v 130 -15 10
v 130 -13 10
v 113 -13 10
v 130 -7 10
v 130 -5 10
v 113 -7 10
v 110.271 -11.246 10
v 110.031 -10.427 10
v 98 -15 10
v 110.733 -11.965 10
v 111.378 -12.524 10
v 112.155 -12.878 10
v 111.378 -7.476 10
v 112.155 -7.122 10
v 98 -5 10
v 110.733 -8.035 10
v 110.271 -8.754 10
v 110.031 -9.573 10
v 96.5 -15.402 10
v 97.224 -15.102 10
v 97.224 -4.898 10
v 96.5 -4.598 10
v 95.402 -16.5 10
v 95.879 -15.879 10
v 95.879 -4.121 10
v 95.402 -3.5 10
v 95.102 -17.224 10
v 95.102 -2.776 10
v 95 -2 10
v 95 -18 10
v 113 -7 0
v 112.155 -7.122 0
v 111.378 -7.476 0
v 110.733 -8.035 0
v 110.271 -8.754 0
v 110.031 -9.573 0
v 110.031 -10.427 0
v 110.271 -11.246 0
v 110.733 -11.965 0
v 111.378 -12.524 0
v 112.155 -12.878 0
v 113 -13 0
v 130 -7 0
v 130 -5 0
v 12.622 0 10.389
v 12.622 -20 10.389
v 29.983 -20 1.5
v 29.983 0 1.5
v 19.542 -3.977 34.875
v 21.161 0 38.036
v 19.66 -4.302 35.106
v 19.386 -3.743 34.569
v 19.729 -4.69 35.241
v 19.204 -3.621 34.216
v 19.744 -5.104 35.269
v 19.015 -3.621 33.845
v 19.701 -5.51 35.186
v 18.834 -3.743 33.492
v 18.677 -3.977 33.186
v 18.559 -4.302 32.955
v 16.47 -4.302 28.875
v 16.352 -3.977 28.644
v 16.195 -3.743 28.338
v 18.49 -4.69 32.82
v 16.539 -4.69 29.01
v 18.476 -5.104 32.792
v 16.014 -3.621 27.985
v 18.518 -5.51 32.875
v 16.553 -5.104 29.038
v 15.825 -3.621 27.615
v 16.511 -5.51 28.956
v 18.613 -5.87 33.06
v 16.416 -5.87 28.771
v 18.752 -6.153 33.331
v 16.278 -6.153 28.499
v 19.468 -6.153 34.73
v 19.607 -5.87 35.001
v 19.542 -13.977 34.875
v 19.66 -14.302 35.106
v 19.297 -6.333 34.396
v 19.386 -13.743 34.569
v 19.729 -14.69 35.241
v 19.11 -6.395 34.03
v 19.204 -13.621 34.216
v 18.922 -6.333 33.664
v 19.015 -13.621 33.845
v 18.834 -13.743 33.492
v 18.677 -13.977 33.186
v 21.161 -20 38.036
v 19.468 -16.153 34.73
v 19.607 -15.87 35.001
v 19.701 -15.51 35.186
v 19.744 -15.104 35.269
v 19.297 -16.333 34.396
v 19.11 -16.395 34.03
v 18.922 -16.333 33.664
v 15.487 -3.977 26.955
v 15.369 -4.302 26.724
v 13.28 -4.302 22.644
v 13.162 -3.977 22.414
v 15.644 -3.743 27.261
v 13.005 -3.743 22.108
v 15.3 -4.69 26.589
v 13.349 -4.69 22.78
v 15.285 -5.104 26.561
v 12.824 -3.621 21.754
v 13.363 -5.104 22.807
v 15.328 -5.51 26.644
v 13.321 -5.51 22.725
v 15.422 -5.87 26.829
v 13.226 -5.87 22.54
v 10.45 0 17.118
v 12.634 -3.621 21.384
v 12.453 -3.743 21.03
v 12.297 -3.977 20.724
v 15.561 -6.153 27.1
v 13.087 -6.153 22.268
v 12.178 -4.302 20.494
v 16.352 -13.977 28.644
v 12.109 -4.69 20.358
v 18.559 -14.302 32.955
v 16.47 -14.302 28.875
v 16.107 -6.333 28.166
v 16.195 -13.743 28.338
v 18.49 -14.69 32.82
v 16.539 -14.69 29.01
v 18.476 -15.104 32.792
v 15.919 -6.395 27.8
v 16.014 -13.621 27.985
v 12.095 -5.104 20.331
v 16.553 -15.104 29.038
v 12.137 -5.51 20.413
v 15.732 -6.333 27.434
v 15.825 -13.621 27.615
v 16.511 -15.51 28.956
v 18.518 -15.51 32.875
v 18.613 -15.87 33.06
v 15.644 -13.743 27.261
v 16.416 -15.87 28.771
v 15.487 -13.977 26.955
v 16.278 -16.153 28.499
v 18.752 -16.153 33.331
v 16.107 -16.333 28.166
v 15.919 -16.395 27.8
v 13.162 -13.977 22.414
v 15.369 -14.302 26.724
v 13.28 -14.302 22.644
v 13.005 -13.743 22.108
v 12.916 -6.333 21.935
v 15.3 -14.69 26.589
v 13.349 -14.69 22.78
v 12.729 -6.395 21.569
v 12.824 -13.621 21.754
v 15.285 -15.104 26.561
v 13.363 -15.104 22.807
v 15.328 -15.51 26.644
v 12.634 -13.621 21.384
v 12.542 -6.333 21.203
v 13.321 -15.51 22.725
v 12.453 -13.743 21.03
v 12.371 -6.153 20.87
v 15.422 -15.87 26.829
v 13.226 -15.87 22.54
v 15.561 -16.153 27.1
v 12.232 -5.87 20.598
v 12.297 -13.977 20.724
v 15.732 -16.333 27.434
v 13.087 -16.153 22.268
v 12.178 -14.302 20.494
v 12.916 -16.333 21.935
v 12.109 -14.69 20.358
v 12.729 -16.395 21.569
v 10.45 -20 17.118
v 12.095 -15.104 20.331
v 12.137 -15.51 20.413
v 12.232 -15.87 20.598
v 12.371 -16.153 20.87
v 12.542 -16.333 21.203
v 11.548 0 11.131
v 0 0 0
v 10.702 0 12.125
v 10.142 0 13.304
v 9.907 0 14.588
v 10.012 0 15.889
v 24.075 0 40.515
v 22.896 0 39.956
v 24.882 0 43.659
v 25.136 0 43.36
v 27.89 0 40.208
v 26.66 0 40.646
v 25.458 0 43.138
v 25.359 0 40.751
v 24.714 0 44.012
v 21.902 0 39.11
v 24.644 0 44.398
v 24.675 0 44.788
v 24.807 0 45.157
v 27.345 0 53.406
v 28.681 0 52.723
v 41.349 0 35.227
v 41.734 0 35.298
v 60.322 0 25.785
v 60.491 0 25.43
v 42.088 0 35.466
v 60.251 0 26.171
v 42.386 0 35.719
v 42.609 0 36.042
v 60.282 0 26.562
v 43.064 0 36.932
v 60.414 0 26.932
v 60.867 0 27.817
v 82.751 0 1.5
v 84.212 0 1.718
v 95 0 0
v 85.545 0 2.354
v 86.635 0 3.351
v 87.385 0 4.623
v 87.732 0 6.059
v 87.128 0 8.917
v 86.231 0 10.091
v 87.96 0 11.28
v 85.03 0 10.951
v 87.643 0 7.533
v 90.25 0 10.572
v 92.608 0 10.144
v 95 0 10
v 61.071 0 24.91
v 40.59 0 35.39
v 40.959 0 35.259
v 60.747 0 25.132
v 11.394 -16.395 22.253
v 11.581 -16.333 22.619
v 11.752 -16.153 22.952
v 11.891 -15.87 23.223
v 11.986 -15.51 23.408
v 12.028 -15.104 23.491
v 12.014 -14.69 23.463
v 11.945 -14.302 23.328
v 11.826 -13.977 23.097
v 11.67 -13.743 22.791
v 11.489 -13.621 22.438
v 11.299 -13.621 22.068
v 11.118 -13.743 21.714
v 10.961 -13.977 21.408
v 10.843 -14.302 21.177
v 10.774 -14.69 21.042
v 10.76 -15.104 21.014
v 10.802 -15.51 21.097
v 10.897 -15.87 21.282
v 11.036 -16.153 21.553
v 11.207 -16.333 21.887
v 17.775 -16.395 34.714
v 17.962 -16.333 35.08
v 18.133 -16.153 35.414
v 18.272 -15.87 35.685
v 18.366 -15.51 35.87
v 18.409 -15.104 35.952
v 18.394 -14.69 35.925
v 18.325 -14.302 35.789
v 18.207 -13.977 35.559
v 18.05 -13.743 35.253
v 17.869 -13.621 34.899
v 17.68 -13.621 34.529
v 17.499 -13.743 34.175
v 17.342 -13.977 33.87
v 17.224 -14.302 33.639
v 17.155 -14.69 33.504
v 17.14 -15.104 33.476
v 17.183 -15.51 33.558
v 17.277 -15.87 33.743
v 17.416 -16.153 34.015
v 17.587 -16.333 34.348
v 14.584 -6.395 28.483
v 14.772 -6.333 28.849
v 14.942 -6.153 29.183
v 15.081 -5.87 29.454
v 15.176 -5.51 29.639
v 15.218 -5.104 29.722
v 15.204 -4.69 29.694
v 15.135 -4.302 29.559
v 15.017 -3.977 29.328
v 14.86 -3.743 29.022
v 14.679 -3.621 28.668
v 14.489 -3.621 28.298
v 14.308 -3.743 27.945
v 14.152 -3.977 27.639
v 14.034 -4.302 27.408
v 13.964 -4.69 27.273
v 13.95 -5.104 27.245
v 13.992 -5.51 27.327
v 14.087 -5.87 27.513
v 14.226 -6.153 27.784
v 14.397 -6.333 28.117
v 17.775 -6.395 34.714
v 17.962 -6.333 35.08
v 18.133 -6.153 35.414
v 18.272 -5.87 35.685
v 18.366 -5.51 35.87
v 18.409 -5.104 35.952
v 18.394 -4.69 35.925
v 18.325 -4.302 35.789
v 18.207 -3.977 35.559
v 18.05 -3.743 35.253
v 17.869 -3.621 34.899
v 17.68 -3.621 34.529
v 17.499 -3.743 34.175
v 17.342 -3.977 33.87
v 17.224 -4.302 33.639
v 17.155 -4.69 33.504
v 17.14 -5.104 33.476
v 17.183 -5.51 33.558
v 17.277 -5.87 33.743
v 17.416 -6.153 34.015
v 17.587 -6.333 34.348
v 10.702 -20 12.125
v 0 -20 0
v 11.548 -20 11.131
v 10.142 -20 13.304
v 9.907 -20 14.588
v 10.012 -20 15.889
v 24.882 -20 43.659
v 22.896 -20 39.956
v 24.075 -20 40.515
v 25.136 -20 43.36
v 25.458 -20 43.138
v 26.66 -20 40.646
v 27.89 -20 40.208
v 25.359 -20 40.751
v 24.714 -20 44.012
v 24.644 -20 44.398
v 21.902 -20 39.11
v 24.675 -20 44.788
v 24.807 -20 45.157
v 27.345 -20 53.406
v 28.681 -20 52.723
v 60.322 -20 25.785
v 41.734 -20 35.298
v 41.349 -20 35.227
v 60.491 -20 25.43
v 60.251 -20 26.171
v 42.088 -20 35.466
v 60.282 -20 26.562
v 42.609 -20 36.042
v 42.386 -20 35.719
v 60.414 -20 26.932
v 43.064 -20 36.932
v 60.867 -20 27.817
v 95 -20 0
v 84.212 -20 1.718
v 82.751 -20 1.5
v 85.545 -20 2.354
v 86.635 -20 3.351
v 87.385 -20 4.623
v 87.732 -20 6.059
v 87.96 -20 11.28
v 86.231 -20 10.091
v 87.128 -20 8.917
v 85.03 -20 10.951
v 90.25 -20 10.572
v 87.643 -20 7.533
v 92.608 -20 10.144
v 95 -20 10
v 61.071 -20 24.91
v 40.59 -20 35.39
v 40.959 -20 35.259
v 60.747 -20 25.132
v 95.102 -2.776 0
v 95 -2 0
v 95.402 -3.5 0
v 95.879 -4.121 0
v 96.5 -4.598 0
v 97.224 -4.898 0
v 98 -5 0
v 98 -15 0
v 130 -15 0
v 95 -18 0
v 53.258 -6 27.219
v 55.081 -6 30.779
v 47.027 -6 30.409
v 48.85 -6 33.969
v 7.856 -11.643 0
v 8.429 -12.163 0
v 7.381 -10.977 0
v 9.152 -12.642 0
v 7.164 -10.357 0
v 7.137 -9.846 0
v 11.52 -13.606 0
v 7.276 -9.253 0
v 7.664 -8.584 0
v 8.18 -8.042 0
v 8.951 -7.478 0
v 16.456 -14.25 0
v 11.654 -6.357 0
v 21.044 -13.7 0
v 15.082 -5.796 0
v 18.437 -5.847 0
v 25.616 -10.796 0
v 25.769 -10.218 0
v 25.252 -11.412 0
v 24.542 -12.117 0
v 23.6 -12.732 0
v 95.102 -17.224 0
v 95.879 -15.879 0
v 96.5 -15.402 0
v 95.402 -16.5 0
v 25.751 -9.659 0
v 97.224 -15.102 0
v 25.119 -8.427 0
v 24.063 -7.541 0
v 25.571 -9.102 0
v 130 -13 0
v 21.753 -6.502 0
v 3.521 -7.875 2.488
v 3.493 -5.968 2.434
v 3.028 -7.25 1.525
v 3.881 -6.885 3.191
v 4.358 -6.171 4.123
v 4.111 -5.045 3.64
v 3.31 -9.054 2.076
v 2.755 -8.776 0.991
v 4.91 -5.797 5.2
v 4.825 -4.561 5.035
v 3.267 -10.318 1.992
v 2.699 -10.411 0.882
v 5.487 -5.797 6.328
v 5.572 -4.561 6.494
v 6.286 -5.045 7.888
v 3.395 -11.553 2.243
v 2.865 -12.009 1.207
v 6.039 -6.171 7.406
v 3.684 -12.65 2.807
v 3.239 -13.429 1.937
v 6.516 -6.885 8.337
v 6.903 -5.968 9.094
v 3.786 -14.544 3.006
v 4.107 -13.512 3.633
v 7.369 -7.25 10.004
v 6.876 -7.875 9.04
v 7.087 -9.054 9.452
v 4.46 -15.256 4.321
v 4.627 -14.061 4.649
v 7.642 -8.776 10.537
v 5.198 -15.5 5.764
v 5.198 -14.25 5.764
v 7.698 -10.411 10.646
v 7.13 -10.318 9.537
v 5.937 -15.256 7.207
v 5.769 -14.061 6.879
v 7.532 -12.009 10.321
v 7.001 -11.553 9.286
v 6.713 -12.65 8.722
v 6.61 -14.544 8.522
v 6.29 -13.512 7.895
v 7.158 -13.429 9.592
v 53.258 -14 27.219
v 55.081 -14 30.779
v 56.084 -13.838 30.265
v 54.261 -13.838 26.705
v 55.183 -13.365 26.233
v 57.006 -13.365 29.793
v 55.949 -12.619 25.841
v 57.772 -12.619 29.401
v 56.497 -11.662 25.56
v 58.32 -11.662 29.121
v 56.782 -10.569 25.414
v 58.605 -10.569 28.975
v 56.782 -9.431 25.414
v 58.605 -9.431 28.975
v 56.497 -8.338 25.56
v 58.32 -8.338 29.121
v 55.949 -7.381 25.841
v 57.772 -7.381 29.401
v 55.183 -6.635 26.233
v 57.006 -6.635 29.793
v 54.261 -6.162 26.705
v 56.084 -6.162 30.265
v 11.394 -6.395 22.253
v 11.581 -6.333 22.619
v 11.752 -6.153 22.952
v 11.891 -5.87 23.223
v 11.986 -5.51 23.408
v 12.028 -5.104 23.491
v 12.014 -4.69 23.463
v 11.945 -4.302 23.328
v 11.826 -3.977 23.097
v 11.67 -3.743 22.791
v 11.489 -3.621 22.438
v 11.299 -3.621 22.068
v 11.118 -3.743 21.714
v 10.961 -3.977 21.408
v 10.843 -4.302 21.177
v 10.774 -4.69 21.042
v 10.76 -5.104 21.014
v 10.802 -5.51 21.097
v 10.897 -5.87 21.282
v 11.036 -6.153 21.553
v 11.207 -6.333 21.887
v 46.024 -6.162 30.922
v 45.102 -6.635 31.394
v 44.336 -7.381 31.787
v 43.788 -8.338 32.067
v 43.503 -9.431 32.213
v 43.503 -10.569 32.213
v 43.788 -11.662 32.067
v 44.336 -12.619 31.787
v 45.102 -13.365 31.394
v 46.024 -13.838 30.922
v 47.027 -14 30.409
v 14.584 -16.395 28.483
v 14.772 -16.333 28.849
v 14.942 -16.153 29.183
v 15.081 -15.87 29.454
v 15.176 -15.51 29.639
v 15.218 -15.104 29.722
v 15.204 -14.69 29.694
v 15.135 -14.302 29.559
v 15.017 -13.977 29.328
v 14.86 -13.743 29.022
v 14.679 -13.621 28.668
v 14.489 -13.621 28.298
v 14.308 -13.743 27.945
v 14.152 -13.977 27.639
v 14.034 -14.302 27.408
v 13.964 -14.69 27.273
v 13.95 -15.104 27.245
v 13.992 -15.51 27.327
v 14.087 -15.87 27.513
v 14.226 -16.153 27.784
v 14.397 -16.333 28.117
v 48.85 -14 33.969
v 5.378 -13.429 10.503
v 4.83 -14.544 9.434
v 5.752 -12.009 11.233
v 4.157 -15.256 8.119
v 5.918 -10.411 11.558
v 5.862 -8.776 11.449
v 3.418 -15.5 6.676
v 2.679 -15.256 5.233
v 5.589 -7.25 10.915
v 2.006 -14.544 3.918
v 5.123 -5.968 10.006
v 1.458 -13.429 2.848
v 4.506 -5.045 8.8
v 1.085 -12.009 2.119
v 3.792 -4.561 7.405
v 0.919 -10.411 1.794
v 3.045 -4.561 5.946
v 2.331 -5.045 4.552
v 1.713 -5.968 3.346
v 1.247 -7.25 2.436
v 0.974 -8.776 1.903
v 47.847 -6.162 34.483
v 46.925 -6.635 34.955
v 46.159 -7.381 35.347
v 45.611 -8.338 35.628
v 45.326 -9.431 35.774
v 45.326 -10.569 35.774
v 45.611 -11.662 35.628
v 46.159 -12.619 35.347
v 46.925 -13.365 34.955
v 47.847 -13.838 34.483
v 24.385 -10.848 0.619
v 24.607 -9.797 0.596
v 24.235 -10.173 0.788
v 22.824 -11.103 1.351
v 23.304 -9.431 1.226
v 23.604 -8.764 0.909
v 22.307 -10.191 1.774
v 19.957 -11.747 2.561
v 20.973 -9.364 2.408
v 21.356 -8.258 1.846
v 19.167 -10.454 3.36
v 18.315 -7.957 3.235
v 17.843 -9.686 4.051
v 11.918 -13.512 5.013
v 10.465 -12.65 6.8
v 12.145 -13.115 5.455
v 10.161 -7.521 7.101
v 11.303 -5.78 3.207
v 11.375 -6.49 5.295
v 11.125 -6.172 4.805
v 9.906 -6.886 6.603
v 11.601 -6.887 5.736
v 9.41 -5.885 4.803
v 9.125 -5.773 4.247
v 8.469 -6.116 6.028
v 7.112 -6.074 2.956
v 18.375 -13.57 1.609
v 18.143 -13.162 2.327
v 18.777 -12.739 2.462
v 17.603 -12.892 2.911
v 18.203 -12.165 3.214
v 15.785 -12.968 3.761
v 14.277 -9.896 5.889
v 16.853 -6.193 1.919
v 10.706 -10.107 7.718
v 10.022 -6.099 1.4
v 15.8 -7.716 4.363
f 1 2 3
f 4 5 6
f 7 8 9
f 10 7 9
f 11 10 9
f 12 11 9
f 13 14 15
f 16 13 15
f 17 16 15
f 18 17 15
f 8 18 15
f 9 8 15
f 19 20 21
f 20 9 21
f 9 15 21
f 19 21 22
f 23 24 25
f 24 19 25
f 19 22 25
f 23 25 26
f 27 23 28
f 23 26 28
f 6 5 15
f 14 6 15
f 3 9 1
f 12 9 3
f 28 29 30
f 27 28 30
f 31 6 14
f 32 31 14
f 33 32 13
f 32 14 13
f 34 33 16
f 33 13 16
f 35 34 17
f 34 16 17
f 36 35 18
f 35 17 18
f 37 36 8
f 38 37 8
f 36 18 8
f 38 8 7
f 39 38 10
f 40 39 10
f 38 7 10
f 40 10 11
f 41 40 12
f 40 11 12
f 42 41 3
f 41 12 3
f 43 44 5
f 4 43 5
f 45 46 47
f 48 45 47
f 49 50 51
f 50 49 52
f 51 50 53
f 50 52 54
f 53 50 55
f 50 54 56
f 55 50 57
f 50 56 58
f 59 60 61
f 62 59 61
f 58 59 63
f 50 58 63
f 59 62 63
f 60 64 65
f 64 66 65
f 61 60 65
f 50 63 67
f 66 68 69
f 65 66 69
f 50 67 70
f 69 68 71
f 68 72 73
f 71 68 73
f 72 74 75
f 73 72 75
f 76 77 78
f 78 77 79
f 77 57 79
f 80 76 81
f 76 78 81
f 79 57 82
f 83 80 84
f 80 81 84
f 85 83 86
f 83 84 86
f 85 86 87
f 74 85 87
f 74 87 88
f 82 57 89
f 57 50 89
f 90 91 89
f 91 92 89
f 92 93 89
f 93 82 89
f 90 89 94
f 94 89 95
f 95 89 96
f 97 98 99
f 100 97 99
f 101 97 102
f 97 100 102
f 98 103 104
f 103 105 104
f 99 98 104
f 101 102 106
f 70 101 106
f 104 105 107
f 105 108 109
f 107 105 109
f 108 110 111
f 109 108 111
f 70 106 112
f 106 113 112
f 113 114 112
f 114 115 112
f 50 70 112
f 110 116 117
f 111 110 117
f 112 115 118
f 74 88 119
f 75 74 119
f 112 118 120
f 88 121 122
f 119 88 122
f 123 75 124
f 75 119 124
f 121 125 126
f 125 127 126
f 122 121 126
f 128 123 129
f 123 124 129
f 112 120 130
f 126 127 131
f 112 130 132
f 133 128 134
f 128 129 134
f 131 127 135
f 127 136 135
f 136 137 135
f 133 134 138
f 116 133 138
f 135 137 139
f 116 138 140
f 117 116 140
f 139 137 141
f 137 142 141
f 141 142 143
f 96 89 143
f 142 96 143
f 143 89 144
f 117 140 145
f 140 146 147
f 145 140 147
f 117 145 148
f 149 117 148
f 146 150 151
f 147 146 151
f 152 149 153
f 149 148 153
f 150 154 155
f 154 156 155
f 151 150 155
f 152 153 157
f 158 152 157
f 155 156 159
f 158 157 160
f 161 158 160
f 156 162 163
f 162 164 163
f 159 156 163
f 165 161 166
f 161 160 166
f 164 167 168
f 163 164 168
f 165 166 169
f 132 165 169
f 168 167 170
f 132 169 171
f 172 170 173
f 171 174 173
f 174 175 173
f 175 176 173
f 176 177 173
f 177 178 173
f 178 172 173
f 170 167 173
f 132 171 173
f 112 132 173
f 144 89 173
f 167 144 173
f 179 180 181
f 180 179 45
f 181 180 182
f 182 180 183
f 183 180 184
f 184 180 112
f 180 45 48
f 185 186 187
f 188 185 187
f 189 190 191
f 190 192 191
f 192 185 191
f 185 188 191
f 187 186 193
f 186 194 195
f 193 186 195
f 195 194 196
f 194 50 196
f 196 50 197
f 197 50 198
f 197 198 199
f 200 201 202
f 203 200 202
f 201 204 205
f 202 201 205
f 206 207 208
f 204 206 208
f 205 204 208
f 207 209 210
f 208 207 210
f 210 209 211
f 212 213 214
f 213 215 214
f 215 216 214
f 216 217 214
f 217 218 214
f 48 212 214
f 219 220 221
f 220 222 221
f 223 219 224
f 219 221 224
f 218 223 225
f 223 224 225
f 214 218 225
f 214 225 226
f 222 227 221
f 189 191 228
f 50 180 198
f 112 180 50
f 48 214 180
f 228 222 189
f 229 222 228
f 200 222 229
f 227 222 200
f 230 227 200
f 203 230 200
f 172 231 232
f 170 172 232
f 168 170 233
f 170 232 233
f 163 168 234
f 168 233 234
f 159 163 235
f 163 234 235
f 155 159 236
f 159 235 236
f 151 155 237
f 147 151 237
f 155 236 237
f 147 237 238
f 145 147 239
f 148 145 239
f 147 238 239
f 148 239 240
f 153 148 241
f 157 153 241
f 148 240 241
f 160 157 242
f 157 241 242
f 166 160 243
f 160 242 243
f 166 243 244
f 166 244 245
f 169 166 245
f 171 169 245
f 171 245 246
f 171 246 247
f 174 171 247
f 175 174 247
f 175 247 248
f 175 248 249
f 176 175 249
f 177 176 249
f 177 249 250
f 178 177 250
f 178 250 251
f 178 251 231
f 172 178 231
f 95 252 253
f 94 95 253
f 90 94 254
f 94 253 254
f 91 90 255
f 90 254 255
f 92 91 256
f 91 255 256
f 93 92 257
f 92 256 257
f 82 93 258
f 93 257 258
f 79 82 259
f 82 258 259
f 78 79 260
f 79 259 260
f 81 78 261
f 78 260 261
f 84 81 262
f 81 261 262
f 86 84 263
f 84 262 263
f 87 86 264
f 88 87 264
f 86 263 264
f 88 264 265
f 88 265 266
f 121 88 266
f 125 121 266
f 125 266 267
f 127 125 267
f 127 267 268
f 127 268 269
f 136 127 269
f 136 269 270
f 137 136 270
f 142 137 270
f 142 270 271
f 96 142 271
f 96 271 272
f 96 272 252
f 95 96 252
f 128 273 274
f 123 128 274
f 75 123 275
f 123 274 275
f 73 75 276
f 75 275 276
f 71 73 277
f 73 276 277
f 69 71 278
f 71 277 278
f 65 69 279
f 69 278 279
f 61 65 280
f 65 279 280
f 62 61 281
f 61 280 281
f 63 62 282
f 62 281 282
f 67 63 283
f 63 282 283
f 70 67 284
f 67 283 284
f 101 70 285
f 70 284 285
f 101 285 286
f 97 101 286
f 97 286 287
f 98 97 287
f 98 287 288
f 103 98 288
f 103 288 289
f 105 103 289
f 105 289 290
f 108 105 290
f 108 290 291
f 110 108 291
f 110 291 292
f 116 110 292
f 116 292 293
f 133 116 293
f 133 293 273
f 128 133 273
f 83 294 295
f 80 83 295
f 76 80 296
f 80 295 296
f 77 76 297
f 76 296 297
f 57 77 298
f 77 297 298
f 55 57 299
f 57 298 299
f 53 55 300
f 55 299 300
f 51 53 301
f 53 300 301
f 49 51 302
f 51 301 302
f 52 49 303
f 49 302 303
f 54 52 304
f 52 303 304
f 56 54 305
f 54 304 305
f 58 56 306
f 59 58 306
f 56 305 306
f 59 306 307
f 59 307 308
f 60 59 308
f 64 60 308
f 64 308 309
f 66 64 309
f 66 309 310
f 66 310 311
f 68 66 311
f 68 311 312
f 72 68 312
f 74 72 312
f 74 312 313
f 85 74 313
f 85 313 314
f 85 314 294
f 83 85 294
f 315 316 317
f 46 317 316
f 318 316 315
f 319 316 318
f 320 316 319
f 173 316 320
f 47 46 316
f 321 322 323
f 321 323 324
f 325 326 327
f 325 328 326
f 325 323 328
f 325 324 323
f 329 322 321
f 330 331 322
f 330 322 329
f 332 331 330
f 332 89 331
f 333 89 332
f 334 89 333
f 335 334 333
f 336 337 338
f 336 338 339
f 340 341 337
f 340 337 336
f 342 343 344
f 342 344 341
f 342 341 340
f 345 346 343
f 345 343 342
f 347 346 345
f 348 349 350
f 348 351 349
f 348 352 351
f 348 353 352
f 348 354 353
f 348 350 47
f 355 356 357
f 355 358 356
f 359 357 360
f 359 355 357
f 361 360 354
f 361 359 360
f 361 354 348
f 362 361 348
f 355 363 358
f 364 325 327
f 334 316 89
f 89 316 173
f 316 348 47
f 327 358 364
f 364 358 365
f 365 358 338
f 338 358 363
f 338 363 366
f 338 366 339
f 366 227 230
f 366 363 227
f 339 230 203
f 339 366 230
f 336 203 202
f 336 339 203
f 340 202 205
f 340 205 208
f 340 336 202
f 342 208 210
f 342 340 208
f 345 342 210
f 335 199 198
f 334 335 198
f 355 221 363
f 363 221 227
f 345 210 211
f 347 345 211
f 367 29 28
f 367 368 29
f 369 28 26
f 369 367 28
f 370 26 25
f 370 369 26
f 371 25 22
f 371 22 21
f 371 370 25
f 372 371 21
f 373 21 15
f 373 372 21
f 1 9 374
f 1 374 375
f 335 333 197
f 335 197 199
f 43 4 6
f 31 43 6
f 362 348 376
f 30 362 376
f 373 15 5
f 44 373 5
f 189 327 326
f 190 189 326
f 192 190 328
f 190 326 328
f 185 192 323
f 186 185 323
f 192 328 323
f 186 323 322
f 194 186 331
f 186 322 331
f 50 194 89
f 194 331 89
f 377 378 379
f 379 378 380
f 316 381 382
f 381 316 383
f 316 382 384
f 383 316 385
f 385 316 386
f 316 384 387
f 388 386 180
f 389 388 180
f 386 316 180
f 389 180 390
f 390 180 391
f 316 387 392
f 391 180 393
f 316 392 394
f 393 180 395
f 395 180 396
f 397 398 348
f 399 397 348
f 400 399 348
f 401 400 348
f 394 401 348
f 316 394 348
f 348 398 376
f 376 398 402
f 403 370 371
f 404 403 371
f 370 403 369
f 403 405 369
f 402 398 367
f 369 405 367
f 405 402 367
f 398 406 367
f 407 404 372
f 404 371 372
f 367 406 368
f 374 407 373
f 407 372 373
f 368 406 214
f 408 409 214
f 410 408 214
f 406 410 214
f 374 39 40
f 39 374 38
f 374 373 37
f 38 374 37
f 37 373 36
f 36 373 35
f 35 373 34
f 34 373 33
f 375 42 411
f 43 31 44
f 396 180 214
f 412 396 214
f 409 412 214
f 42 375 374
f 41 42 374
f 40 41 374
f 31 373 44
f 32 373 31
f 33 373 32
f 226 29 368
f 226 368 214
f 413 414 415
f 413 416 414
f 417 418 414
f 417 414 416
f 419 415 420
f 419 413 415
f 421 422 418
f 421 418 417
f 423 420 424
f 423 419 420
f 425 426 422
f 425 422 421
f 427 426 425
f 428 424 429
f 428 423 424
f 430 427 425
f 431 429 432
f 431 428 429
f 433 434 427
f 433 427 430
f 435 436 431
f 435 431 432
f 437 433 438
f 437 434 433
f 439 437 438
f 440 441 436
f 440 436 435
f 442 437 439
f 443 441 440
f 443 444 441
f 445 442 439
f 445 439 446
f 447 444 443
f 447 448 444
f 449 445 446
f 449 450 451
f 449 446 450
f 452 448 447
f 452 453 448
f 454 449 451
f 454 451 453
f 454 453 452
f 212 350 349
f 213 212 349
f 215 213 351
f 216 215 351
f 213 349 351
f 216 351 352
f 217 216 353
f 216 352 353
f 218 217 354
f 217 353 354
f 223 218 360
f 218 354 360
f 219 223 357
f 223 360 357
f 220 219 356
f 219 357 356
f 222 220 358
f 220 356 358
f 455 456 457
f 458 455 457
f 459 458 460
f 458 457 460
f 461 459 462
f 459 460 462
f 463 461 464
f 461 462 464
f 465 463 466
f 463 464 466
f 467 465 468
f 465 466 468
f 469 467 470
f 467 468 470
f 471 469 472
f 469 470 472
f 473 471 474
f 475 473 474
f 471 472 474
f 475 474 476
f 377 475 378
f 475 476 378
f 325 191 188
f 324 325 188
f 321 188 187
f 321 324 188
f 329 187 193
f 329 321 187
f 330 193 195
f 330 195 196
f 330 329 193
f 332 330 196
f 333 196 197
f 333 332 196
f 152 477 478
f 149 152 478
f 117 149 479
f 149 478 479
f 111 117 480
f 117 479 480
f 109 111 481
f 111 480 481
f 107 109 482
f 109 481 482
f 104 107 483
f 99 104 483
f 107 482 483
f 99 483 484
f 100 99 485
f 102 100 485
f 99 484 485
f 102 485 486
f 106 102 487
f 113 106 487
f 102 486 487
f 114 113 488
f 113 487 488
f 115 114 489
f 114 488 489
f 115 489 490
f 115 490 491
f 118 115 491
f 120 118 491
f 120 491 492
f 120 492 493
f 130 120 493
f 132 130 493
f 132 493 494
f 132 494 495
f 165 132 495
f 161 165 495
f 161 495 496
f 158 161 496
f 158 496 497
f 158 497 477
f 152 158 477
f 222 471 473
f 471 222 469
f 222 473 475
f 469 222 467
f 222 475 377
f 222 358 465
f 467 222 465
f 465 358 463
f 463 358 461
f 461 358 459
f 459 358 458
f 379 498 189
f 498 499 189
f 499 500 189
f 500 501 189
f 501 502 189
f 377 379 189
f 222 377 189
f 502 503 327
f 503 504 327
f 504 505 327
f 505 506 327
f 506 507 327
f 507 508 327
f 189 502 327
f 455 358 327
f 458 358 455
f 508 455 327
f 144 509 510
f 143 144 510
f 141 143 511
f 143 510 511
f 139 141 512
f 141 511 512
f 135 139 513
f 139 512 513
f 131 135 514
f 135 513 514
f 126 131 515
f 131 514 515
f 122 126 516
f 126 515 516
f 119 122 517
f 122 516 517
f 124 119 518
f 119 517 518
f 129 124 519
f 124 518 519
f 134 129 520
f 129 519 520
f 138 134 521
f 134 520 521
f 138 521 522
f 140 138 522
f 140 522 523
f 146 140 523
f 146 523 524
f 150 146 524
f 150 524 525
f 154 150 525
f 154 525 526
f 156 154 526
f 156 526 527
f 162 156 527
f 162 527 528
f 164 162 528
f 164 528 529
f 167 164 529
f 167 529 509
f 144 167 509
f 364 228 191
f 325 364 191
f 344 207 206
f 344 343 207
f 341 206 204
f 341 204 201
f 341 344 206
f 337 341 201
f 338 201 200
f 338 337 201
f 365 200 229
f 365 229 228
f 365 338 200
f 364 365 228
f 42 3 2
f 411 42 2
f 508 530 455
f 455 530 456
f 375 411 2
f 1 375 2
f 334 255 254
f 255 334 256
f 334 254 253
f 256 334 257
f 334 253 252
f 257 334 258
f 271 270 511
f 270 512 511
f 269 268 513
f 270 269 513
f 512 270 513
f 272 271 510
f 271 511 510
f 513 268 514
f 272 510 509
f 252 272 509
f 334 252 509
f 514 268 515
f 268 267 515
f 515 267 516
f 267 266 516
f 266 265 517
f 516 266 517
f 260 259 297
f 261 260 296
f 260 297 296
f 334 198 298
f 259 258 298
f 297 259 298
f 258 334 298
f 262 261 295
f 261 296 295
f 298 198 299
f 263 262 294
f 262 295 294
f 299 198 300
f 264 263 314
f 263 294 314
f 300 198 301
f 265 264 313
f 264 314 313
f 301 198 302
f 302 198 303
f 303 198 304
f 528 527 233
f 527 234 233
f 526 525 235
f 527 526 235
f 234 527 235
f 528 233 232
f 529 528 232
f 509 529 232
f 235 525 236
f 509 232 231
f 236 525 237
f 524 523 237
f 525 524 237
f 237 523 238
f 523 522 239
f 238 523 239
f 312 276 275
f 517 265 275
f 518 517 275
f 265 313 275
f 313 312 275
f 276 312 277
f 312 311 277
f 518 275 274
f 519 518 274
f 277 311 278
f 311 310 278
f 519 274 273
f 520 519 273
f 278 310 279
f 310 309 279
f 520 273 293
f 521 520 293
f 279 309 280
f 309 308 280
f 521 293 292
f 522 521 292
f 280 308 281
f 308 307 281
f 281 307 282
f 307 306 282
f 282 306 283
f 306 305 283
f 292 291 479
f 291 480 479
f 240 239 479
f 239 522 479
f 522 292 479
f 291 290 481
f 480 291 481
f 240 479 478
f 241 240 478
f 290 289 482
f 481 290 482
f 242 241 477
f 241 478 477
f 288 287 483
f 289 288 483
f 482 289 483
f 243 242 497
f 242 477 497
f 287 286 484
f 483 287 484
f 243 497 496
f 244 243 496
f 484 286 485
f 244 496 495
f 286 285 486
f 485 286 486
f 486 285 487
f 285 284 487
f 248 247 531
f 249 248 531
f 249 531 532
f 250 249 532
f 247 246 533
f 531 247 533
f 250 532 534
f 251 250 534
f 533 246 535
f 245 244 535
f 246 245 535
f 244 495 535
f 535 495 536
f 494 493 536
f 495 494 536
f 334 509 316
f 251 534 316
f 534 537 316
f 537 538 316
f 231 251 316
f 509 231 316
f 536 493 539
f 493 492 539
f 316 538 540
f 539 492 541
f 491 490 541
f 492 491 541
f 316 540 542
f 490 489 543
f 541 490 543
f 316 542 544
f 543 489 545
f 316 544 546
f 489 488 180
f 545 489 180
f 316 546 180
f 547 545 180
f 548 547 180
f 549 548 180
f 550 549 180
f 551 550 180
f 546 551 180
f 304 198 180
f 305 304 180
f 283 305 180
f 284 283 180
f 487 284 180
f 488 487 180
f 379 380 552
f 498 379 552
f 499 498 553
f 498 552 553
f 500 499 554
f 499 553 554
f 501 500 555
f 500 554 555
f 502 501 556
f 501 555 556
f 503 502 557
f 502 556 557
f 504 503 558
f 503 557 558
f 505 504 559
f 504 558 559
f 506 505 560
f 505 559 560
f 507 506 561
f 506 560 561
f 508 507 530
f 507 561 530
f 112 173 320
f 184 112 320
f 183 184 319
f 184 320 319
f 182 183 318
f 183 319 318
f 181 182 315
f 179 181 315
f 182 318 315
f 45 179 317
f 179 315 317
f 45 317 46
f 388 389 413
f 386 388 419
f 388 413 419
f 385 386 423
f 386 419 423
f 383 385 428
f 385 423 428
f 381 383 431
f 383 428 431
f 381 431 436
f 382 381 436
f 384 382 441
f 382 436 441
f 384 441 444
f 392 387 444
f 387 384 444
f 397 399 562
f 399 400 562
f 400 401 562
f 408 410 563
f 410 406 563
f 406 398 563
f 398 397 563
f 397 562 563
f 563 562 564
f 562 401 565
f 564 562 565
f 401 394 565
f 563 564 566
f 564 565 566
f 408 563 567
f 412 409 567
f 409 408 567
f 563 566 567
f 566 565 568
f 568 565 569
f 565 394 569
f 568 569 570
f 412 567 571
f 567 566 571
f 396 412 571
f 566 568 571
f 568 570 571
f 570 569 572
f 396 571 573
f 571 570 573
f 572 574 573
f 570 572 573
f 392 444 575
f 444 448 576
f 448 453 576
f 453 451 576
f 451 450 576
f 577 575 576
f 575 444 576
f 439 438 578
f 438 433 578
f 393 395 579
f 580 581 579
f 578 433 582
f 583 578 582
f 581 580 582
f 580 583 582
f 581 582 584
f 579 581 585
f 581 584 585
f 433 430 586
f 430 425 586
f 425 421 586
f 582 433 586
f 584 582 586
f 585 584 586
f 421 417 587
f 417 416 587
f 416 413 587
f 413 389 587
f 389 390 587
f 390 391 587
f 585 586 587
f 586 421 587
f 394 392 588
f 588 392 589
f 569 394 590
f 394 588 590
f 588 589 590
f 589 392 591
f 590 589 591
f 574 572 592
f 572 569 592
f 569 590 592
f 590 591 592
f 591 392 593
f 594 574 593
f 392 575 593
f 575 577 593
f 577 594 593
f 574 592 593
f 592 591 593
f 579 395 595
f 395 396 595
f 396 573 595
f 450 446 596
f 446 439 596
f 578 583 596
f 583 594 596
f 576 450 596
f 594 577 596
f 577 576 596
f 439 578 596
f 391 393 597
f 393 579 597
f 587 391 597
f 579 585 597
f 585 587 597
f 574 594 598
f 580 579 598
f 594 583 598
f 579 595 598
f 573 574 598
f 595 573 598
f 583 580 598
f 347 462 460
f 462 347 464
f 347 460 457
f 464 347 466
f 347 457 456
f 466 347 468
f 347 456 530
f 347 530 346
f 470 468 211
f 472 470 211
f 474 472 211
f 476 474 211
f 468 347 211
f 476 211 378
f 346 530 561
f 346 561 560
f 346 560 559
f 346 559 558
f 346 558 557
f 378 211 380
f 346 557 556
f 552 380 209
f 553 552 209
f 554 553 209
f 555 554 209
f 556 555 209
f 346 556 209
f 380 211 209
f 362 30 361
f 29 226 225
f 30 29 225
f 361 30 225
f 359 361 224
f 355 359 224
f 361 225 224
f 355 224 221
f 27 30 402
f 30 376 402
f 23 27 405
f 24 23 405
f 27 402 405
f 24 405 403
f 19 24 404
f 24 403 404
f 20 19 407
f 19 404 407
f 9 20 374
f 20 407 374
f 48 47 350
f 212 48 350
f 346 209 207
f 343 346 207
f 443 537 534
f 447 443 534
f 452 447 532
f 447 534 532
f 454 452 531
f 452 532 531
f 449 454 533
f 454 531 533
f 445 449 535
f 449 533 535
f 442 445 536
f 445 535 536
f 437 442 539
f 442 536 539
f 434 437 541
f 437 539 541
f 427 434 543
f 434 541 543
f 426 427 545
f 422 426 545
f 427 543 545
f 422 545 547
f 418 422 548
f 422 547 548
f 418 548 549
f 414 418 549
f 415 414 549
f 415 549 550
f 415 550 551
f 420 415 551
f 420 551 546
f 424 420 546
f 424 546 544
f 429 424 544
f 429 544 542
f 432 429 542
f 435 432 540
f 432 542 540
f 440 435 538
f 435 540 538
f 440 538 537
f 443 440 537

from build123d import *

# Parameters (mm, degrees)
F1_DEPTH  = 20
F2_R      = 1.5
F3_W      = 35
F3_H      = 5
F4_DEPTH  = 10.001
F5_R      = 3
F7_DEPTH  = 10.001
F9_DEPTH  = 4
F11_DEPTH = 20.001
F12_R     = 5.5
F12_R_2   = 4.25
F13_DEPTH = 2
F14_DEPTH = 115.7145863741
F15_R     = 1.395
F16_DEPTH = 25


with BuildPart() as f1:
    # F0 (on Front) → F1 (new body)
    with BuildSketch(Plane.XZ):
        with BuildLine():
            Line((27.3453882208, 53.4062706342), (0, 0))
            Line((0, 0), (130, 0))
            Line((130, 0), (130, 10))
            Line((130, 10), (95, 10))
            ThreePointArc((95, 10), (91.4222885738, 10.322602282), (87.9599949346, 11.2800019049))
            Line((87.9599949346, 11.2800019049), (59.727160706, 25.5913320091))
            Line((59.727160706, 25.5913320091), (60.8665518818, 27.8165932856))
            Line((60.8665518818, 27.8165932856), (43.0644616704, 36.9317226925))
            Line((43.0644616704, 36.9317226925), (41.9250704946, 34.7064614161))
            Line((41.9250704946, 34.7064614161), (24.1229802832, 43.821590823))
            Line((24.1229802832, 43.821590823), (28.6805449866, 52.7226359287))
            Line((28.6805449866, 52.7226359287), (27.3453882208, 53.4062706342))
        make_face()
    extrude(amount=F1_DEPTH)

    # F2
    f2_edges = [f1.edges().sort_by_distance(p)[0] for p in [
        (59.727161, -10, 25.591332),
        (24.12298, -10, 43.821591),
        (41.92507, -10, 34.706461),
    ]]
    fillet(f2_edges, radius=F2_R)

    # F3 (on face) → F4 (cut, through all)
    with BuildSketch(Plane.XY.offset(10)):
        with Locations((112.5, -2.5)):
            Rectangle(F3_W, F3_H)
        with Locations((112.5, -17.5)):
            Rectangle(F3_W, F3_H)
    extrude(amount=-F4_DEPTH, mode=Mode.SUBTRACT)

    # F5
    f5_edges = [f1.edges().sort_by_distance(p)[0] for p in [
        (95, -15, 5),
        (95, -5, 5),
    ]]
    fillet(f5_edges, radius=F5_R)

    # F6 (on face) → F7 (cut, through all)
    with BuildSketch(Plane.XY.offset(10)):
        with BuildLine():
            Line((130, -13), (130, -7))
            Line((130, -7), (113, -7))
            ThreePointArc((113, -7), (110, -10), (113, -13))
            Line((113, -13), (130, -13))
        make_face()
    extrude(amount=-F7_DEPTH, mode=Mode.SUBTRACT)

    # F8 (on face) → F9 (cut)
    with BuildSketch(Plane(origin=(23.9272146932, 0, 46.7304868049), x_dir=(0.8901045106, 0, -0.4557564703), z_dir=(0.4557564703, 0, 0.8901045106))):
        with BuildLine():
            Line((35, -6), (28, -6))
            ThreePointArc((28, -6), (24, -10), (28, -14))
            Line((28, -14), (35, -14))
            ThreePointArc((35, -14), (39, -10), (35, -6))
        make_face()
    extrude(amount=-F9_DEPTH, mode=Mode.SUBTRACT)

    # F10 (on face) → F11 (cut, through all)
    with BuildSketch(Plane.XZ.offset(20)):
        with BuildLine():
            ThreePointArc((27.8898681305, 40.2076517054), (24.0754335556, 40.5154662833), (21.1605632259, 38.0359115043))
            Line((21.1605632259, 38.0359115043), (10.4502861728, 17.1184555059))
            ThreePointArc((10.4502861728, 17.1184555059), (10.1424715949, 13.304020931), (12.6220263739, 10.3891506013))
            Line((12.6220263739, 10.3891506013), (29.9827739665, 1.5))
            Line((29.9827739665, 1.5), (82.7510373087, 1.5))
            ThreePointArc((82.7510373087, 1.5), (87.6117272167, 5.3279532356), (85.0298196604, 10.9505225529))
            Line((85.0298196604, 10.9505225529), (27.8898681305, 40.2076517054))
        make_face()
    extrude(amount=-F11_DEPTH, mode=Mode.SUBTRACT)

    # F12 (on face) → F13 (cut)
    with BuildSketch(Plane(origin=(0, 0, 0), x_dir=(0, -1, 0), z_dir=(-0.8901045106, 0, 0.4557564703))):
        with Locations((10, 7.5)):
            Circle(F12_R)
        with Locations((10, 7.5)):
            Circle(F12_R_2, mode=Mode.SUBTRACT)
    extrude(amount=-F13_DEPTH, mode=Mode.SUBTRACT)

    # F14 (cut, through all): a face of the model
    f14_faces = [f1.faces().sort_by_distance(p)[0] for p in [
        (3.4181735276, -10, 6.6757838293),
    ]]
    extrude(f14_faces, amount=-F14_DEPTH, mode=Mode.SUBTRACT)

    # F15 (on face) → F16 (cut)
    with BuildSketch(Plane(origin=(0, 0, 0), x_dir=(0, -1, 0), z_dir=(-0.8901045106, 0, 0.4557564703))):
        with Locations((5, 25)):
            Circle(F15_R)
        with Locations((5, 39)):
            Circle(F15_R)
        with Locations((5, 32)):
            Circle(F15_R)
        with Locations((15, 39)):
            Circle(F15_R)
        with Locations((15, 32)):
            Circle(F15_R)
        with Locations((15, 25)):
            Circle(F15_R)
    extrude(amount=-F16_DEPTH, mode=Mode.SUBTRACT)


solid = f1.part
